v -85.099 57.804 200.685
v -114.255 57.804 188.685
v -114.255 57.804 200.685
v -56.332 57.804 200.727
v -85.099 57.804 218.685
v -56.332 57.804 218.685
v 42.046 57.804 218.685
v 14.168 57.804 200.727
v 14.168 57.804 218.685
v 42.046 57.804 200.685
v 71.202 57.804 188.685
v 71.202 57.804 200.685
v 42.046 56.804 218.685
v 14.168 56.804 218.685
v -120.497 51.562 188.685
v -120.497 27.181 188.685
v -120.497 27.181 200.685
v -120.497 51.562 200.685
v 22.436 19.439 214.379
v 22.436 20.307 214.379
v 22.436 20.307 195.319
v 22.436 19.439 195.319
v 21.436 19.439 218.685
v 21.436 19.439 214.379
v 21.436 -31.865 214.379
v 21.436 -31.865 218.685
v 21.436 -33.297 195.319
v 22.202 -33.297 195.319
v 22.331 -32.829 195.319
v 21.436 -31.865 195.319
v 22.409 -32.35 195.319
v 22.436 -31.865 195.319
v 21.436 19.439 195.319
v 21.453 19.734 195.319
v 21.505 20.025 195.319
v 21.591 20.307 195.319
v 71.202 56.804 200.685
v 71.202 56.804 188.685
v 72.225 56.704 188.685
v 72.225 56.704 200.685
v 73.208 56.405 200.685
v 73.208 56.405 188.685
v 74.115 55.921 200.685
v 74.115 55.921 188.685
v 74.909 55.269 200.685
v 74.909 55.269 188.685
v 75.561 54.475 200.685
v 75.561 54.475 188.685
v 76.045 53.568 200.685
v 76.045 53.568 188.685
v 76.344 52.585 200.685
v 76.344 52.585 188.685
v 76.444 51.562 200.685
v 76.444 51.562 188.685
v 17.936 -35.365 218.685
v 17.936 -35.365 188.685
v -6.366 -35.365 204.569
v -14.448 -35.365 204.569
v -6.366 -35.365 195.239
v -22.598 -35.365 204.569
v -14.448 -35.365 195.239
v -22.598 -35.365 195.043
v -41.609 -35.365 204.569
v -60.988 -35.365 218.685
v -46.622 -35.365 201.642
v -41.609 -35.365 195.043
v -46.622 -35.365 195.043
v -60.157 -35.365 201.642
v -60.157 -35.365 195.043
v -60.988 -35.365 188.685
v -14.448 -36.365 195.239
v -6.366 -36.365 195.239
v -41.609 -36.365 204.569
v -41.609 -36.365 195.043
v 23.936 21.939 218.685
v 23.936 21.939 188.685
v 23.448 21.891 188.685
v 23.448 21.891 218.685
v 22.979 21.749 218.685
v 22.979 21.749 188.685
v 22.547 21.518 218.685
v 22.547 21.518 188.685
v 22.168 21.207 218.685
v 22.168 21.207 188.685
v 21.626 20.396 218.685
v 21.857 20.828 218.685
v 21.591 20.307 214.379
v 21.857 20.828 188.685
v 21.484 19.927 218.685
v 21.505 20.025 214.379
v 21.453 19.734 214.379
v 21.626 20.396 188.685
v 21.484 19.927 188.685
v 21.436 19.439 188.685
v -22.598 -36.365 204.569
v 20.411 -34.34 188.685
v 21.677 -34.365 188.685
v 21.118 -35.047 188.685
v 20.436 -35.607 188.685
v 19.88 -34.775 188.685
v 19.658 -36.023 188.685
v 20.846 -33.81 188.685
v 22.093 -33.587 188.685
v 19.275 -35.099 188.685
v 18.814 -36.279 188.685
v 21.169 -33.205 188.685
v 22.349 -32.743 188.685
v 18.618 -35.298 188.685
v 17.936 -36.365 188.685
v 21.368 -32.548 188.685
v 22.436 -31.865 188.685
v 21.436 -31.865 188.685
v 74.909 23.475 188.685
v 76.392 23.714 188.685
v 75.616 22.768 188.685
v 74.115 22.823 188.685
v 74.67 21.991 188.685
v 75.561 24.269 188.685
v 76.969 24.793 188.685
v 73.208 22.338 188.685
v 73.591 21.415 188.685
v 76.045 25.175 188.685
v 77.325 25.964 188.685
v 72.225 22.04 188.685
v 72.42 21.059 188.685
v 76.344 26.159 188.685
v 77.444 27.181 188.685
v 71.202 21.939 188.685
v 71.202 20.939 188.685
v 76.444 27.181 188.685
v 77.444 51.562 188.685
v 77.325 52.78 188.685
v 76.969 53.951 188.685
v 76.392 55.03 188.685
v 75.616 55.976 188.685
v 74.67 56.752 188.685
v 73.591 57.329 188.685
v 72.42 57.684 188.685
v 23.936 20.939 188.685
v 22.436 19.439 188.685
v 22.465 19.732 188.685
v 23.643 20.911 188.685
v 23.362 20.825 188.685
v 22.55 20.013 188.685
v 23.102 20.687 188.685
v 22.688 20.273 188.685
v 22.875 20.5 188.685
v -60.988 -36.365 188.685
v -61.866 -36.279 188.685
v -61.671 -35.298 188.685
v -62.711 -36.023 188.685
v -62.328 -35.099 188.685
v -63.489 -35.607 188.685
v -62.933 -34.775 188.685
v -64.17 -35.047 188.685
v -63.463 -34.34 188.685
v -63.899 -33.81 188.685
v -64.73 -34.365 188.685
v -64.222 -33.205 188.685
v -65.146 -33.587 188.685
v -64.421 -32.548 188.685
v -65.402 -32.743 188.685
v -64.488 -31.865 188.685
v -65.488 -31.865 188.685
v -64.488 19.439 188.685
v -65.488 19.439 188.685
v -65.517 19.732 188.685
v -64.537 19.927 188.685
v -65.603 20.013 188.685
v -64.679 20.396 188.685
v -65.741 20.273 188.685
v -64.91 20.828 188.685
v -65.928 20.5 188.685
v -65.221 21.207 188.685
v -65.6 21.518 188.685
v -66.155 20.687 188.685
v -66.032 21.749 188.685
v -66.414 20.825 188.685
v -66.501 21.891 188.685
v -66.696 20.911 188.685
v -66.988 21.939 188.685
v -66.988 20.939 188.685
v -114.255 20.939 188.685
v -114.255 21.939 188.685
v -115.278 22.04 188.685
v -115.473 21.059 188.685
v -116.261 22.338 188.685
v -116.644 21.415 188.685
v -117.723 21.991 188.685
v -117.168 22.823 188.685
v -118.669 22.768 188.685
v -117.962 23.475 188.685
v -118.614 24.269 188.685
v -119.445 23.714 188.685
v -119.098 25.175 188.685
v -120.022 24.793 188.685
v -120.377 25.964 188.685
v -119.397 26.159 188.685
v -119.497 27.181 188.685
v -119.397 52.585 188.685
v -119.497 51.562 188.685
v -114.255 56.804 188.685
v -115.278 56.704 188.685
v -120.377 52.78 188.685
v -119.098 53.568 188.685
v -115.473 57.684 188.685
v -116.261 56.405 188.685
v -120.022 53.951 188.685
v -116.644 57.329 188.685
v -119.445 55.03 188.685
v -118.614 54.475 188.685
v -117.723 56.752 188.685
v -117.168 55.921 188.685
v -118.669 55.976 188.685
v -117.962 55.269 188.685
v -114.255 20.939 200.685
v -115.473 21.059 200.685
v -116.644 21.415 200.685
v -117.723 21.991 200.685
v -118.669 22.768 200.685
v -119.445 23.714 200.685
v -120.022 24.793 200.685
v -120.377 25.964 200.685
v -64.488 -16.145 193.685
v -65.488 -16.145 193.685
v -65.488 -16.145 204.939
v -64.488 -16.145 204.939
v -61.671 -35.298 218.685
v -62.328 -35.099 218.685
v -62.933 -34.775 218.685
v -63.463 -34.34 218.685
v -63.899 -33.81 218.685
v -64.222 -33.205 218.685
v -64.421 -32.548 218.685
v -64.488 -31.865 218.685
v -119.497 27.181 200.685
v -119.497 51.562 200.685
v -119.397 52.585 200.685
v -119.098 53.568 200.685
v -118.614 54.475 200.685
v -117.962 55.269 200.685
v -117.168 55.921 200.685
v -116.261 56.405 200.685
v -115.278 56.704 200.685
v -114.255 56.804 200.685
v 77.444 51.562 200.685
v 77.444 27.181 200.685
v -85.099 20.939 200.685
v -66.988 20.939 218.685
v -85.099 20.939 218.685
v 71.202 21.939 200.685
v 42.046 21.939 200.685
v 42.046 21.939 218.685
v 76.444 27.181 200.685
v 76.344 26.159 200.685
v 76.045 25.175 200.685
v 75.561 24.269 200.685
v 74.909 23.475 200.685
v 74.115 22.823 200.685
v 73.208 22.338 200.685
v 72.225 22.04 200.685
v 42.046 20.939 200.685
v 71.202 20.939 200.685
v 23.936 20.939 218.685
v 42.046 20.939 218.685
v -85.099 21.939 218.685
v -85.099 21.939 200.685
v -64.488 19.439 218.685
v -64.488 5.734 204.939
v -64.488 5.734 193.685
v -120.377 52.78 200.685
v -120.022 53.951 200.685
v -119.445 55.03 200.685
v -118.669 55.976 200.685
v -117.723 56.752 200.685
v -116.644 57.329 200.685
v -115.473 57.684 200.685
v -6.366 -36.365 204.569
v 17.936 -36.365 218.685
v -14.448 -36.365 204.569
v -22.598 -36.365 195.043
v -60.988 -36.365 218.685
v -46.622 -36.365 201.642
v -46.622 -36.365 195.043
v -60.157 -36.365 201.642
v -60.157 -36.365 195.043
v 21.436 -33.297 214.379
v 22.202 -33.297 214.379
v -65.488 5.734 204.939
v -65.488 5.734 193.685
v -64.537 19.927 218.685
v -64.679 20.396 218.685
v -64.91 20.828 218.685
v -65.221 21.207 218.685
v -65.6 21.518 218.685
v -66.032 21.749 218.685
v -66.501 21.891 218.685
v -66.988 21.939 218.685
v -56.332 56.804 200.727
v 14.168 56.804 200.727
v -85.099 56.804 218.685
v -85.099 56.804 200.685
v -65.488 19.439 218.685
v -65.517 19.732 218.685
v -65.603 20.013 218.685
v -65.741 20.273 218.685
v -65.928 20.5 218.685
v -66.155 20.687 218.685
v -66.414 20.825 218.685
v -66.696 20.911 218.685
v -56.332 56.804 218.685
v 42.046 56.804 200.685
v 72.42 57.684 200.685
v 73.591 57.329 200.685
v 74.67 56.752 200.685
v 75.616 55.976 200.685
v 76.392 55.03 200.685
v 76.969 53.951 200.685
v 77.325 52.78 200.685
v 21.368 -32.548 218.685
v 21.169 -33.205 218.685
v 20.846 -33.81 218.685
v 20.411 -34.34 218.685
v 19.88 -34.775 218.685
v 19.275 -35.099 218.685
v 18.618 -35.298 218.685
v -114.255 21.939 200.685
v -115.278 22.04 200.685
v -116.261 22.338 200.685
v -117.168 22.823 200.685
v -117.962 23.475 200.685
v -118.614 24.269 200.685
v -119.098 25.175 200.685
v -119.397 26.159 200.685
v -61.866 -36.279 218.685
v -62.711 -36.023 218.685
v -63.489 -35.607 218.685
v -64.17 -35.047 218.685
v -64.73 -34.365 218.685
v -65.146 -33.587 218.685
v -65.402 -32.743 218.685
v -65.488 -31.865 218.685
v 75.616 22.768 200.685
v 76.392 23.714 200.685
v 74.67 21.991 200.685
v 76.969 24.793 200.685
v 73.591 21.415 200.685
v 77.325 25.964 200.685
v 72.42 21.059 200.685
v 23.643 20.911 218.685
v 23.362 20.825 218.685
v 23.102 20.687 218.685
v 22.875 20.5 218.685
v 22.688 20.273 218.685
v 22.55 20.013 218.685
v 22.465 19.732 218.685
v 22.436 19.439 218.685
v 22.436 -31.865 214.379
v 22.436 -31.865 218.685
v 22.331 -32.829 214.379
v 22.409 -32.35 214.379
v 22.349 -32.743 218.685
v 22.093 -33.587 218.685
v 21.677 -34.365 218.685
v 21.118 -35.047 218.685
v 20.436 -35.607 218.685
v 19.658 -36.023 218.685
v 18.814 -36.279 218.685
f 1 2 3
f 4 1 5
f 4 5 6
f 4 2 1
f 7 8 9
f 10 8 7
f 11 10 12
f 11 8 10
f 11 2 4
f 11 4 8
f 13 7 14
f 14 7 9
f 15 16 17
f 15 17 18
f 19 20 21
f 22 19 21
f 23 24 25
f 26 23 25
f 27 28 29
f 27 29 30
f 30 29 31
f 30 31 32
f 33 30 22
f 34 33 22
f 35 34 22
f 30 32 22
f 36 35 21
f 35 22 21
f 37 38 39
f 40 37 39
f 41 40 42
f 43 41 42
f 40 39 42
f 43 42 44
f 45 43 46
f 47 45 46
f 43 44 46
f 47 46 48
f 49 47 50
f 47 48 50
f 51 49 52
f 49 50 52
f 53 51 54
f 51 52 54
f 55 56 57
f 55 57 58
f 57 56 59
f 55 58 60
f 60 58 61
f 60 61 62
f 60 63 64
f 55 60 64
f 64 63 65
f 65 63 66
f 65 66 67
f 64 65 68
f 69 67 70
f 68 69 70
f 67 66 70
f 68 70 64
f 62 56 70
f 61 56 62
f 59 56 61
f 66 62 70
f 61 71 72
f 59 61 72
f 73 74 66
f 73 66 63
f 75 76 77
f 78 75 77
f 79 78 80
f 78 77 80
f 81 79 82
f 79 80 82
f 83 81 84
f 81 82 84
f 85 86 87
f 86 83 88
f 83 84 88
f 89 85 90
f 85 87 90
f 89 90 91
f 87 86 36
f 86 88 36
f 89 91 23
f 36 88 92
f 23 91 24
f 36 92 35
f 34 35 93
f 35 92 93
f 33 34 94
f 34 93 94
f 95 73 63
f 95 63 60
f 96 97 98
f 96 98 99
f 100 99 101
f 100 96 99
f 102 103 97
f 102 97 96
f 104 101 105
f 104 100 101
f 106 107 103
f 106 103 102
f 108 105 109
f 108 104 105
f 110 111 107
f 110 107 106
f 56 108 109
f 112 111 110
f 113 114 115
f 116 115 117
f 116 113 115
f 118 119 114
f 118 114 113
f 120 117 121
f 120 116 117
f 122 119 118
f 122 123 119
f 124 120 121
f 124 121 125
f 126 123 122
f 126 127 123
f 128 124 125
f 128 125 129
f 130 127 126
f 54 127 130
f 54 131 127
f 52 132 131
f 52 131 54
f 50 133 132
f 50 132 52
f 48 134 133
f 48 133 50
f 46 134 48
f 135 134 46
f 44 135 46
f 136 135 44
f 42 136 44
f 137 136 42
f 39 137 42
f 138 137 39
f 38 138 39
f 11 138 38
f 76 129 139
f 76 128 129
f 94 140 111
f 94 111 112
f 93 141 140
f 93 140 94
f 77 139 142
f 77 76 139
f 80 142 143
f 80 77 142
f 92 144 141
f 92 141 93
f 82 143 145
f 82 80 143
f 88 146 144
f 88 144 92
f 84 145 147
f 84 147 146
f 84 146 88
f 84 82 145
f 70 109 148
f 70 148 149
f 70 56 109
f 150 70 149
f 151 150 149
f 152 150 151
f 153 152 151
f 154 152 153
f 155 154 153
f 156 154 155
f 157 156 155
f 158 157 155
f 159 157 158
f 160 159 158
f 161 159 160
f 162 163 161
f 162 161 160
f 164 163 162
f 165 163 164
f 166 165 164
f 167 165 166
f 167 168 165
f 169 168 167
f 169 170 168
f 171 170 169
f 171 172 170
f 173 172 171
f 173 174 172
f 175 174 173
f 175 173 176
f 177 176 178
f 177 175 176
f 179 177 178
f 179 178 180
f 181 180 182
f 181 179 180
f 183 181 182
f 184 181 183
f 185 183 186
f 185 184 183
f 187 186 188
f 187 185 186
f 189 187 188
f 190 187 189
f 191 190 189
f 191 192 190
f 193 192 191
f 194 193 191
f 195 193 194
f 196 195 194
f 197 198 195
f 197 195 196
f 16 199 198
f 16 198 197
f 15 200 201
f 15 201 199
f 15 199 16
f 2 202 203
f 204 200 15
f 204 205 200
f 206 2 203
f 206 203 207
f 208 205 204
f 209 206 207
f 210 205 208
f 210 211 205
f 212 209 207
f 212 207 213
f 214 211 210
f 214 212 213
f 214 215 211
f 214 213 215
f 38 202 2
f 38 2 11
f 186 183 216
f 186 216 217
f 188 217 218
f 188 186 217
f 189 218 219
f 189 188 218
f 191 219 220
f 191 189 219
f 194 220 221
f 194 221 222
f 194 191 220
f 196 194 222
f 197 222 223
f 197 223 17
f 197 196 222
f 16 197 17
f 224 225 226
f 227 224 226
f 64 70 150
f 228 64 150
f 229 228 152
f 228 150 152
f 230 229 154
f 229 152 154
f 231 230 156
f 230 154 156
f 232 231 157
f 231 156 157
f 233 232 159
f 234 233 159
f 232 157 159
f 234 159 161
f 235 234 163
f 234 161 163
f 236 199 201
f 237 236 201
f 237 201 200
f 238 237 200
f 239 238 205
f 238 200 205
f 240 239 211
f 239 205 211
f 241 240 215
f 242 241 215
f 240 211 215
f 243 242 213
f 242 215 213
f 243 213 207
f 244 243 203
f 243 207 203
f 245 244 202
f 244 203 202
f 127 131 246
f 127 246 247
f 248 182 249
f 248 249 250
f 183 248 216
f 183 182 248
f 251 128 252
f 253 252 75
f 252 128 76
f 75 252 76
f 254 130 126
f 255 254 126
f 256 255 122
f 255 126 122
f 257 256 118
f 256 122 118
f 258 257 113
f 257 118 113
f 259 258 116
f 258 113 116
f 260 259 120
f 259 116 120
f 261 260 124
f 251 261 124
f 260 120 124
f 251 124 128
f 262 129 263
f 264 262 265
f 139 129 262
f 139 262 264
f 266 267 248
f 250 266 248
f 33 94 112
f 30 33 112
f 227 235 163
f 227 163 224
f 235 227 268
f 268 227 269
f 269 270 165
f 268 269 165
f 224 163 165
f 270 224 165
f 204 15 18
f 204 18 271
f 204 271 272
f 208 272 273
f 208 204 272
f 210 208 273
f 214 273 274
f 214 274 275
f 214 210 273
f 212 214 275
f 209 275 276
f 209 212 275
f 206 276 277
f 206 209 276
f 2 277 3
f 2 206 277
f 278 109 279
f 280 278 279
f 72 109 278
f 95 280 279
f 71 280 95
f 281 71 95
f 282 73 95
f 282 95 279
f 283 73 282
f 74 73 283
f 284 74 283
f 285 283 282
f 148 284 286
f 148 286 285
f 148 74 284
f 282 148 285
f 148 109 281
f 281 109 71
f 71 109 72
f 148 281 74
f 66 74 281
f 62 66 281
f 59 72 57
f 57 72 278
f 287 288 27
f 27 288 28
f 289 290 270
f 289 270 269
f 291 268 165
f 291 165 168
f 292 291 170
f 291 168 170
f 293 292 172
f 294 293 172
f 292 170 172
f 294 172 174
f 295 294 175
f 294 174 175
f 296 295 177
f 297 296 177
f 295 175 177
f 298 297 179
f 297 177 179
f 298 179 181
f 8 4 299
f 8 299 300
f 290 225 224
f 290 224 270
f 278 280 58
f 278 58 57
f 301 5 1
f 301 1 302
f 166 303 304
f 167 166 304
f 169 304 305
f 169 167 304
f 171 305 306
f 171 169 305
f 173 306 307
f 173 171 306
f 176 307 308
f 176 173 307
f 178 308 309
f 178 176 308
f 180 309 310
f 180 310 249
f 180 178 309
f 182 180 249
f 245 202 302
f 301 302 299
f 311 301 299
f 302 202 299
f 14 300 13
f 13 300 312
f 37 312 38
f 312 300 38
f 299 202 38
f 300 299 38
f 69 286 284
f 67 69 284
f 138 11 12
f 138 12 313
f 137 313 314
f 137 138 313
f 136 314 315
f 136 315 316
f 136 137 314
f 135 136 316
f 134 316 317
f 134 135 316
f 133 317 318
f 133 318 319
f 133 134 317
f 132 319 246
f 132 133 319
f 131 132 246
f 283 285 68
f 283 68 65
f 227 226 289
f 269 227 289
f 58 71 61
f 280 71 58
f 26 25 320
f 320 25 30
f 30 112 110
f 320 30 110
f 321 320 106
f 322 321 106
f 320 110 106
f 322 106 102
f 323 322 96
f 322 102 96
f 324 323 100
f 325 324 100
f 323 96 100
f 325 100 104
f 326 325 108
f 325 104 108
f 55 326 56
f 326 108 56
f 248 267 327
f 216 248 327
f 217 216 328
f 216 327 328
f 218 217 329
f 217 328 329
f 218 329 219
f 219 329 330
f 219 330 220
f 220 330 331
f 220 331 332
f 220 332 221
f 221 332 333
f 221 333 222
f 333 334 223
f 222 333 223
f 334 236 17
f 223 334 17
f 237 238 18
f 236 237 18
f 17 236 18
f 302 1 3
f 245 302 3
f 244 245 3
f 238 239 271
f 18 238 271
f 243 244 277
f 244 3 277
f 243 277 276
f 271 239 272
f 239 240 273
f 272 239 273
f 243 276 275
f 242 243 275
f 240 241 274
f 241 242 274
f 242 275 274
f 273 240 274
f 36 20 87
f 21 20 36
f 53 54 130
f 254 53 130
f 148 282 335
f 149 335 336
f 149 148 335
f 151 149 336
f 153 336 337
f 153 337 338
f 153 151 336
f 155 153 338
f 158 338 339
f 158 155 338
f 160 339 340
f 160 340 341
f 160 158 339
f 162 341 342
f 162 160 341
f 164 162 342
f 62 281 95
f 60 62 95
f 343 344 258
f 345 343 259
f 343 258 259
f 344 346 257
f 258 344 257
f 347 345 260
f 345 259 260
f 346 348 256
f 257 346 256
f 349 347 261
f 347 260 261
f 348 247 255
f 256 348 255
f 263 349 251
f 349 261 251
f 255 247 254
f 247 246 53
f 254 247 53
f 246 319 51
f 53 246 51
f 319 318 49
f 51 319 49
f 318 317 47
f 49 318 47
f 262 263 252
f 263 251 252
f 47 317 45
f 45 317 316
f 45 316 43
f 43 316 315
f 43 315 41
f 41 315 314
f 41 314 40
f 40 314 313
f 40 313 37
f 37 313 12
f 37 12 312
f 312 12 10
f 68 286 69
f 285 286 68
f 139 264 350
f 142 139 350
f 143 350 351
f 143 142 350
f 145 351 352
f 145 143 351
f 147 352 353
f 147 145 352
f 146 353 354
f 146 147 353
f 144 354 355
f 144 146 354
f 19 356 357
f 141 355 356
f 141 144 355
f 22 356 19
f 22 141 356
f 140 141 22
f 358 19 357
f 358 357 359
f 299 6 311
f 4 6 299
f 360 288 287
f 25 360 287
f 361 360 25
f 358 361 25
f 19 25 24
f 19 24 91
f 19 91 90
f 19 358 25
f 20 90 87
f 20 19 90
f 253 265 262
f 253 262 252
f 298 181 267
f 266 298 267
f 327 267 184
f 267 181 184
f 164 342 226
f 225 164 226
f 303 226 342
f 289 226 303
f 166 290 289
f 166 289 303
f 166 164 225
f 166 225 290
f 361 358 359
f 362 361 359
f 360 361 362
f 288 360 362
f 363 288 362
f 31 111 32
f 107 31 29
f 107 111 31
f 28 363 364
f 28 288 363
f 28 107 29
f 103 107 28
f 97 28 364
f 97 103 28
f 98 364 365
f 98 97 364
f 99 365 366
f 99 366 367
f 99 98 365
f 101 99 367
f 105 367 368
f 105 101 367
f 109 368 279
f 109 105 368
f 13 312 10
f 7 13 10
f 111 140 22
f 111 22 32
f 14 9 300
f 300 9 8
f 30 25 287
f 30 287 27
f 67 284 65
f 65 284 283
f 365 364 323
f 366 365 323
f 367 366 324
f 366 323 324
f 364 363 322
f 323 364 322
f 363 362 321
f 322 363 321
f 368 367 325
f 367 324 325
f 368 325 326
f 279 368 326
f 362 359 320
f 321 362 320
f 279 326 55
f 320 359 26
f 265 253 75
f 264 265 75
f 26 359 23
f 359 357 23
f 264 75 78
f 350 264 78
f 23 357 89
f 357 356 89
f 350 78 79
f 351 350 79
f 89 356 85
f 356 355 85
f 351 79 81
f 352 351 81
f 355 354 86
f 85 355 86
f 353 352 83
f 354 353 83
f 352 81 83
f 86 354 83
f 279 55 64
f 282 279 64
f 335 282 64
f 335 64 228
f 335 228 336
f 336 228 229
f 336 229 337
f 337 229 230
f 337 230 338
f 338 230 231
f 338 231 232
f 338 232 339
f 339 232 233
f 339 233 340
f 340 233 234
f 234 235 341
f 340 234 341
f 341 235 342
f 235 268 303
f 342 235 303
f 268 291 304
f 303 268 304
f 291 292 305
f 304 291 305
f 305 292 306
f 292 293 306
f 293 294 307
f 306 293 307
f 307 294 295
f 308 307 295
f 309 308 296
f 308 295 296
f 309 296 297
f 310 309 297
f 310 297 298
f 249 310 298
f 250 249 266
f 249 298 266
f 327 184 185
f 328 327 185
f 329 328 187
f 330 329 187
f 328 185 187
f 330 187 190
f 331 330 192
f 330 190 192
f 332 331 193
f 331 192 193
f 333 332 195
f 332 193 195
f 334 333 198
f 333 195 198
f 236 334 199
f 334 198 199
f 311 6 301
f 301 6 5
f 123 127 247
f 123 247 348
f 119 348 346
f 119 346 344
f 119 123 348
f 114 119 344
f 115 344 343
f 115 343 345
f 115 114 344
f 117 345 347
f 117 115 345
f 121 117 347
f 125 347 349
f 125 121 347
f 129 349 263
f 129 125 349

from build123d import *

# Parameters (mm, degrees)
AUFSATZ_LINEAR_AUSTRAGEN1_DEPTH = 30
SKIZZE4_W                       = 19.059709953
SKIZZE4_H                       = 53.604548155
SCHNITT_LINEAR_AUSTRAGEN1_DEPTH = 1
SKIZZE5_W                       = 13.535379209
SKIZZE5_H                       = 6.598473738
SKIZZE5_W_2                     = 19.010784176
SKIZZE5_H_2                     = 9.525951679
SKIZZE5_W_3                     = 8.081851555
SKIZZE5_H_3                     = 9.33
SCHNITT_LINEAR_AUSTRAGEN2_DEPTH = 1
SKIZZE6_W                       = 11.254395851
SKIZZE6_H                       = 21.878706828
SCHNITT_LINEAR_AUSTRAGEN3_DEPTH = 1
SKIZZE8_W                       = 70.5
SKIZZE8_H                       = 18.817969375
SCHNITT_LINEAR_AUSTRAGEN4_DEPTH = 1
SCHNITT_LINEAR_AUSTRAGEN5_DEPTH = 18


with BuildPart() as part:
    # Skizze2 → Aufsatz-Linear austragen1 (new body)
    with BuildSketch(Plane(origin=(0, 0, 188.684819625), x_dir=(-1, 0, 0), z_dir=(0, 0, -1))):
        with BuildLine():
            Line((114.255256192, 57.804225359), (-71.202450647, 57.804225359))
            ThreePointArc((-71.202450647, 57.804225359), (-75.616222333, 55.975981265), (-77.444466427, 51.562209578))
            Line((-77.444466427, 51.562209578), (-77.444466427, 27.181394091))
            ThreePointArc((-77.444466427, 27.181394091), (-75.616222333, 22.767622404), (-71.202450647, 20.93937831))
            Line((-71.202450647, 20.93937831), (-23.9356809, 20.93937831))
            ThreePointArc((-23.9356809, 20.93937831), (-22.875020729, 20.500038482), (-22.4356809, 19.43937831))
            Line((-22.4356809, 19.43937831), (-22.4356809, -31.865246208))
            ThreePointArc((-22.4356809, -31.865246208), (-21.117661416, -35.047226723), (-17.9356809, -36.365246208))
            Line((-17.9356809, -36.365246208), (60.988486446, -36.365246208))
            ThreePointArc((60.988486446, -36.365246208), (64.170466961, -35.047226723), (65.488486446, -31.865246208))
            Line((65.488486446, -31.865246208), (65.488486446, 19.43937831))
            ThreePointArc((65.488486446, 19.43937831), (65.927826274, 20.500038482), (66.988486446, 20.93937831))
            Line((66.988486446, 20.93937831), (114.255256192, 20.93937831))
            ThreePointArc((114.255256192, 20.93937831), (118.669027879, 22.767622404), (120.497271973, 27.181394091))
            Line((120.497271973, 27.181394091), (120.497271973, 51.562209578))
            ThreePointArc((120.497271973, 51.562209578), (118.669027879, 55.975981265), (114.255256192, 57.804225359))
        make_face()
        with BuildLine():
            Line((114.255256192, 56.804225359), (-71.202450647, 56.804225359))
            ThreePointArc((-71.202450647, 56.804225359), (-74.909115552, 55.268874484), (-76.444466427, 51.562209578))
            Line((-76.444466427, 51.562209578), (-76.444466427, 27.181394091))
            ThreePointArc((-76.444466427, 27.181394091), (-74.909115552, 23.474729185), (-71.202450647, 21.93937831))
            Line((-71.202450647, 21.93937831), (-23.9356809, 21.93937831))
            ThreePointArc((-23.9356809, 21.93937831), (-22.167913947, 21.207145263), (-21.4356809, 19.43937831))
            Line((-21.4356809, 19.43937831), (-21.4356809, -31.865246208))
            ThreePointArc((-21.4356809, -31.865246208), (-20.410554634, -34.340119942), (-17.9356809, -35.365246208))
            Line((-17.9356809, -35.365246208), (60.988486446, -35.365246208))
            ThreePointArc((60.988486446, -35.365246208), (63.46336018, -34.340119942), (64.488486446, -31.865246208))
            Line((64.488486446, -31.865246208), (64.488486446, 19.43937831))
            ThreePointArc((64.488486446, 19.43937831), (65.220719493, 21.207145263), (66.988486446, 21.93937831))
            Line((66.988486446, 21.93937831), (114.255256192, 21.93937831))
            ThreePointArc((114.255256192, 21.93937831), (117.961921098, 23.474729185), (119.497271973, 27.181394091))
            Line((119.497271973, 27.181394091), (119.497271973, 51.562209578))
            ThreePointArc((119.497271973, 51.562209578), (117.961921098, 55.268874484), (114.255256192, 56.804225359))
        make_face(mode=Mode.SUBTRACT)
    extrude(amount=-AUFSATZ_LINEAR_AUSTRAGEN1_DEPTH)

    # Skizze4 → Schnitt-Linear austragen1 (cut)
    with BuildSketch(Plane(origin=(22.4356809, 0, 0), x_dir=(0, 0, -1), z_dir=(1, 0, 0))):
        with Locations((-204.849070455, -6.494967379)):
            Rectangle(SKIZZE4_W, SKIZZE4_H)
    extrude(amount=-SCHNITT_LINEAR_AUSTRAGEN1_DEPTH, mode=Mode.SUBTRACT)

    # Skizze5 → Schnitt-Linear austragen2 (cut)
    with BuildSketch(Plane.XZ.offset(36.365246208)):
        with Locations((-53.389754229, 198.342500668)):
            Rectangle(SKIZZE5_W, SKIZZE5_H)
        with Locations((-32.103878534, 199.806239639)):
            Rectangle(SKIZZE5_W_2, SKIZZE5_H_2)
        with Locations((-10.407185504, 199.904215478)):
            Rectangle(SKIZZE5_W_3, SKIZZE5_H_3)
    extrude(amount=-SCHNITT_LINEAR_AUSTRAGEN2_DEPTH, mode=Mode.SUBTRACT)

    # Skizze6 → Schnitt-Linear austragen3 (cut)
    with BuildSketch(Plane.ZY.offset(65.488486446)):
        with Locations((199.312017551, -5.205318356)):
            Rectangle(SKIZZE6_W, SKIZZE6_H)
    extrude(amount=-SCHNITT_LINEAR_AUSTRAGEN3_DEPTH, mode=Mode.SUBTRACT)

    # Skizze8 → Schnitt-Linear austragen4 (cut)
    with BuildSketch(Plane(origin=(0, 57.804225359, 0), x_dir=(1, 0, 0), z_dir=(0, 1, 0))):
        with Locations((-21.082442705, -210.135508824)):
            Rectangle(SKIZZE8_W, SKIZZE8_H)
    extrude(amount=-SCHNITT_LINEAR_AUSTRAGEN4_DEPTH, mode=Mode.SUBTRACT)

    # Skizze9 → Schnitt-Linear austragen5 (cut)
    with BuildSketch(Plane.XY.offset(218.684819625)):
        with BuildLine():
            Line((77.444466427, 51.562209578), (77.444466427, 27.181394091))
            ThreePointArc((77.444466427, 27.181394091), (75.616222333, 22.767622404), (71.202450647, 20.93937831))
            Line((71.202450647, 20.93937831), (42.046255802, 20.93937831))
            Line((42.046255802, 20.93937831), (42.046255802, 57.804225359))
            Line((42.046255802, 57.804225359), (71.202450647, 57.804225359))
            ThreePointArc((71.202450647, 57.804225359), (75.616222333, 55.975981265), (77.444466427, 51.562209578))
        make_face()
        with BuildLine():
            Line((-85.099061347, 57.804225359), (-85.099061347, 20.93937831))
            Line((-85.099061347, 20.93937831), (-114.255256192, 20.93937831))
            ThreePointArc((-114.255256192, 20.93937831), (-118.669027879, 22.767622404), (-120.497271973, 27.181394091))
            Line((-120.497271973, 27.181394091), (-120.497271973, 51.562209578))
            ThreePointArc((-120.497271973, 51.562209578), (-118.669027879, 55.975981265), (-114.255256192, 57.804225359))
            Line((-114.255256192, 57.804225359), (-85.099061347, 57.804225359))
        make_face()
    extrude(amount=-SCHNITT_LINEAR_AUSTRAGEN5_DEPTH, mode=Mode.SUBTRACT)


solid = part.part
